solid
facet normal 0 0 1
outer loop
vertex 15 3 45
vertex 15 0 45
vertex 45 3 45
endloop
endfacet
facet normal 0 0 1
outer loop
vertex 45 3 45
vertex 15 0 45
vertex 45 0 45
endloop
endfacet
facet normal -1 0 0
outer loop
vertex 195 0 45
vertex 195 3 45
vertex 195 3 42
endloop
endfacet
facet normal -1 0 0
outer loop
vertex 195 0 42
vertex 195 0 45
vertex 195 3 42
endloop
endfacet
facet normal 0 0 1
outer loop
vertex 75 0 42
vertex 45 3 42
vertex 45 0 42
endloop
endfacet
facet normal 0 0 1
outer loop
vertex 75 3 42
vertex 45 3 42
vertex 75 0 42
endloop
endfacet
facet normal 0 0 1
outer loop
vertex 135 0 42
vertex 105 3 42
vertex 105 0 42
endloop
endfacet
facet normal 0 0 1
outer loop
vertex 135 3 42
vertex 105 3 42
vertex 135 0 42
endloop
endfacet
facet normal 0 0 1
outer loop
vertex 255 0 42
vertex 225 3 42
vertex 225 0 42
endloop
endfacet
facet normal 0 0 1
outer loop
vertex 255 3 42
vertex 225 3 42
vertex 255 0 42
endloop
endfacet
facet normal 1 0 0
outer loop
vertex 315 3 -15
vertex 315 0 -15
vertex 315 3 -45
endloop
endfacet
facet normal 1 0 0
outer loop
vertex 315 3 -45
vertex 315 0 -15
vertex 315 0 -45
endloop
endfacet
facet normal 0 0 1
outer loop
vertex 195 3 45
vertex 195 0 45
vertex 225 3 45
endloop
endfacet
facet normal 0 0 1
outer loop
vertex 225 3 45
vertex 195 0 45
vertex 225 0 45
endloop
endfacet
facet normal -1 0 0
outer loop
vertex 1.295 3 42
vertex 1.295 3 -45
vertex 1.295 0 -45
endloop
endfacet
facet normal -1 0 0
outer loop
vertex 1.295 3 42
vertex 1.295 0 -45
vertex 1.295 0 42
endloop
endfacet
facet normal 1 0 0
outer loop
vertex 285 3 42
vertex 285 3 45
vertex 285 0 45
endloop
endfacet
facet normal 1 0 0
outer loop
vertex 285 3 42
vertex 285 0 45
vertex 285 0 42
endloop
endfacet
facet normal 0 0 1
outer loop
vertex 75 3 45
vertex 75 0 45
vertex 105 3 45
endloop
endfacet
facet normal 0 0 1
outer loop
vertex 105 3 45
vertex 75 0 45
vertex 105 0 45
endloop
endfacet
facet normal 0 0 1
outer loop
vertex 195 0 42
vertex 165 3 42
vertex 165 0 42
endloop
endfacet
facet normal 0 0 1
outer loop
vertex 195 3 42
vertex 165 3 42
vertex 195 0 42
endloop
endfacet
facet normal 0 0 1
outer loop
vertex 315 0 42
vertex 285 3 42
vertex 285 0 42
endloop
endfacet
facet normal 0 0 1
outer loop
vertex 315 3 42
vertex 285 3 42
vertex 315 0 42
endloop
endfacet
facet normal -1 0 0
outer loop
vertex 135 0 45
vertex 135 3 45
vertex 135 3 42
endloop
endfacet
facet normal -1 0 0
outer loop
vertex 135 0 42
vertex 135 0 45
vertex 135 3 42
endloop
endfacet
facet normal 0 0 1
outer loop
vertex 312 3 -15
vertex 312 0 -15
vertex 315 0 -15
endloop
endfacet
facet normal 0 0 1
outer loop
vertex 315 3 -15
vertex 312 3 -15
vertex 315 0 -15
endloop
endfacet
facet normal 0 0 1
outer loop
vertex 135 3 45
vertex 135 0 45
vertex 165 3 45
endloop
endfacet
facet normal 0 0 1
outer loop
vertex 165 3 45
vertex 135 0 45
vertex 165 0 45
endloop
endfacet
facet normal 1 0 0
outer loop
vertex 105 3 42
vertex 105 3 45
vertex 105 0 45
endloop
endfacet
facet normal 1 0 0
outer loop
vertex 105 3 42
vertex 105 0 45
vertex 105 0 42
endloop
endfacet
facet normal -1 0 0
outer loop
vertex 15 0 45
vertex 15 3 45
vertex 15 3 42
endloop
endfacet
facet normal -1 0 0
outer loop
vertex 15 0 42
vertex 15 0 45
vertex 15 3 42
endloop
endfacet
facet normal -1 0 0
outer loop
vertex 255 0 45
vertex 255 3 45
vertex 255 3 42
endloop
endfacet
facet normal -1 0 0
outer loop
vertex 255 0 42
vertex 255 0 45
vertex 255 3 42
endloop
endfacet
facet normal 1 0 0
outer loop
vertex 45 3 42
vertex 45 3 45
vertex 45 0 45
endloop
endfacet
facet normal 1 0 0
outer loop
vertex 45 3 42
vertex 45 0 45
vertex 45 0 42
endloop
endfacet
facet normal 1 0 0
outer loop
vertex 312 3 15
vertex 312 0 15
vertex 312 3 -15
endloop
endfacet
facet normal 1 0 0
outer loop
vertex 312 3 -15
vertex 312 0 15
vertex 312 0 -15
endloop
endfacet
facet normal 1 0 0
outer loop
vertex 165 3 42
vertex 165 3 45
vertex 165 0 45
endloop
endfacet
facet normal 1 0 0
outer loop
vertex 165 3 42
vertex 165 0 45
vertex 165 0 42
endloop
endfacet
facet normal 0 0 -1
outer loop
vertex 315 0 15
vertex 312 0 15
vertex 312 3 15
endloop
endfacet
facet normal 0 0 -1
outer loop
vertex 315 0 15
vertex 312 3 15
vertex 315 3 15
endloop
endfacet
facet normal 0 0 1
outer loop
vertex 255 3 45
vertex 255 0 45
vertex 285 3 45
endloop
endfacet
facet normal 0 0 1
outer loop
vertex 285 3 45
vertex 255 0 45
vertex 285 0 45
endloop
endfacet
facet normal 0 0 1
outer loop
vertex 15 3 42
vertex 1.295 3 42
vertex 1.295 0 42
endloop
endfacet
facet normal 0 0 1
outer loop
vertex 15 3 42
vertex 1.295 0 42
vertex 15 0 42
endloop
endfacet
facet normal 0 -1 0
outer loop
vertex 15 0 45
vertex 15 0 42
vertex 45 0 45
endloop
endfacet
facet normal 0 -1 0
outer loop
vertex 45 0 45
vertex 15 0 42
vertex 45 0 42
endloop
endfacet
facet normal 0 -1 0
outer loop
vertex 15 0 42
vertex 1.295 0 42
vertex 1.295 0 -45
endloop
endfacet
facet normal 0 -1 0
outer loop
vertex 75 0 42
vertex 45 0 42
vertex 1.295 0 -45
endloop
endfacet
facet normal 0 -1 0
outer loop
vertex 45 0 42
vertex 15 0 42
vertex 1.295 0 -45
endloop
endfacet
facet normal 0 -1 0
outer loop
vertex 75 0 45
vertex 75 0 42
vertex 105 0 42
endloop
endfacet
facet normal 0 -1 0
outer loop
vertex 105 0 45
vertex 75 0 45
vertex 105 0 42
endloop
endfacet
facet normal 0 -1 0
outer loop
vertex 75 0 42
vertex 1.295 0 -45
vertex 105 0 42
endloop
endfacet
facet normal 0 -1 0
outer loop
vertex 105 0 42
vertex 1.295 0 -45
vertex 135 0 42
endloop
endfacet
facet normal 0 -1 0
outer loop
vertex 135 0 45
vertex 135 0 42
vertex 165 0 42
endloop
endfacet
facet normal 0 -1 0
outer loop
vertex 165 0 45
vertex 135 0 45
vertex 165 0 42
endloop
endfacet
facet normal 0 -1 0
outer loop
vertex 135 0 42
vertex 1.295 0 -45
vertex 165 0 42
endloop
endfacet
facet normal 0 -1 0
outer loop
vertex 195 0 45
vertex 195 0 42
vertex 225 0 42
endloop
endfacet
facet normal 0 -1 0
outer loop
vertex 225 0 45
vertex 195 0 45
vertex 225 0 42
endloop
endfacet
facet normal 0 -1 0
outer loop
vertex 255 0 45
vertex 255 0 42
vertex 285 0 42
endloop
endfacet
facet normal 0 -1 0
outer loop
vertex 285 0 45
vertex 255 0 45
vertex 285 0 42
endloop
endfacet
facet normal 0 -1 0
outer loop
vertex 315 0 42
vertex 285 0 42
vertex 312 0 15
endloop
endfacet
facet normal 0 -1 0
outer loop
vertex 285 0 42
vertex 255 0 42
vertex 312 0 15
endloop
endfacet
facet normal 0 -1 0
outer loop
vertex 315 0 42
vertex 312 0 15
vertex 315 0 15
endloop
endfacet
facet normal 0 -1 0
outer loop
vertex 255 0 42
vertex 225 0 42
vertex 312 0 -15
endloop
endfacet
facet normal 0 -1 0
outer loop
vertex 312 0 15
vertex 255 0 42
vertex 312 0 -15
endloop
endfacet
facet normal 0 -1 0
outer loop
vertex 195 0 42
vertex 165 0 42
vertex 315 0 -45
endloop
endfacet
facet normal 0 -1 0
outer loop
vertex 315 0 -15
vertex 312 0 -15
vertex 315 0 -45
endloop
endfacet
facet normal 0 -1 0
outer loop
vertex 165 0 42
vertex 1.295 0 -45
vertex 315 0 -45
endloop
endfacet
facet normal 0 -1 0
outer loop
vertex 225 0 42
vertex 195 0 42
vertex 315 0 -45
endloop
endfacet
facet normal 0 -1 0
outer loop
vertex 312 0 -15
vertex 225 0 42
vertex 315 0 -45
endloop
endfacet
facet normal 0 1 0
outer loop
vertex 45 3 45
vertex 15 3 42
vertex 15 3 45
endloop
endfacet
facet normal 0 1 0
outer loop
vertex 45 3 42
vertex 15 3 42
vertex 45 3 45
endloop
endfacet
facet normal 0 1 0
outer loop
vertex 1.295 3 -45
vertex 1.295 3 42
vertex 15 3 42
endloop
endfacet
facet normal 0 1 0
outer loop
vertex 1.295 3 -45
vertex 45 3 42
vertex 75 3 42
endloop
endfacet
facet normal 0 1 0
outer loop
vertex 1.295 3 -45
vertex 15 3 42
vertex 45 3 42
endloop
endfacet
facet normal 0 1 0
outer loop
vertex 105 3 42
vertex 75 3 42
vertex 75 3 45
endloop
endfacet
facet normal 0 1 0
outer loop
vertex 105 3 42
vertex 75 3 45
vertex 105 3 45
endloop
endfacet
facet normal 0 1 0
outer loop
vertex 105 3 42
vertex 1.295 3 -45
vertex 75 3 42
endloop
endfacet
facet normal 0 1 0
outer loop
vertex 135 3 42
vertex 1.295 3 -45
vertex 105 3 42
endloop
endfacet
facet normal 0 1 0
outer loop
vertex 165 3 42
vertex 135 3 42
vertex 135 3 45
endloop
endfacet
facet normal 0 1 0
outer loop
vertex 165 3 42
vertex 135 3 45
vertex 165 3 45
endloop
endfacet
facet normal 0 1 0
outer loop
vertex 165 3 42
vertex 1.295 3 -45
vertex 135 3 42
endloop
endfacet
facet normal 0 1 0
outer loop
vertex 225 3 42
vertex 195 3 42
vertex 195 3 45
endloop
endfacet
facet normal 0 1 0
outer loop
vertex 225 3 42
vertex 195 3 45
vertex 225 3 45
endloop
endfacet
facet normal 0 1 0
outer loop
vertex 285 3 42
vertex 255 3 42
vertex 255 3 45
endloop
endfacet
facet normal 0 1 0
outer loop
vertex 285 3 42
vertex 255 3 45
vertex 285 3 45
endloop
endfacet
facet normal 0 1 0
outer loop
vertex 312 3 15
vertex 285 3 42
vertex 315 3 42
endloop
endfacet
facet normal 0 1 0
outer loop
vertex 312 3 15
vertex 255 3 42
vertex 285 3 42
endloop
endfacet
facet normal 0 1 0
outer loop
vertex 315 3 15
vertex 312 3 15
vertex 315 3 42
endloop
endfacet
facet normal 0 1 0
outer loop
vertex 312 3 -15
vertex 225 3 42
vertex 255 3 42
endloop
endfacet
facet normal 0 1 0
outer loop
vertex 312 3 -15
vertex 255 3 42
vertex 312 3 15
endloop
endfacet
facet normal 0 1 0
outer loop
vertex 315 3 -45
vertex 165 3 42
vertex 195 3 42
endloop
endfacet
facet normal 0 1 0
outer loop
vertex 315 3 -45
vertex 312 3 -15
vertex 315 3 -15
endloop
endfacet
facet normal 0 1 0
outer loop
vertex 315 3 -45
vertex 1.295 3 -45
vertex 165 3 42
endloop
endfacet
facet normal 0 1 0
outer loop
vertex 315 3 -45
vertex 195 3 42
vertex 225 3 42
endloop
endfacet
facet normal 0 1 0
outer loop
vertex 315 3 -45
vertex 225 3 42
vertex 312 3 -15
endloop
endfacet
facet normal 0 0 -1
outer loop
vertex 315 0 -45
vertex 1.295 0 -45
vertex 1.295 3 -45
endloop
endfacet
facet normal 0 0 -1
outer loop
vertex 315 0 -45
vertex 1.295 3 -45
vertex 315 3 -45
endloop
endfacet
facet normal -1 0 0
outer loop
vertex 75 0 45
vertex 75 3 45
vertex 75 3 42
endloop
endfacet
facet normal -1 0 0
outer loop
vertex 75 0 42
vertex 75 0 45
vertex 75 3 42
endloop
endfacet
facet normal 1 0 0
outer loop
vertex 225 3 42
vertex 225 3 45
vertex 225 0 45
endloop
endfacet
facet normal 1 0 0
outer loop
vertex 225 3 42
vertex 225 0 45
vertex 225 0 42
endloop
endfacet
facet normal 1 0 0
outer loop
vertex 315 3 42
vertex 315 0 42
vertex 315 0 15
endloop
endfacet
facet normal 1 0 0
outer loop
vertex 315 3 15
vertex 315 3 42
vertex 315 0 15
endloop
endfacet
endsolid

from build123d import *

# Parameters (mm, degrees)
SKETCH1_W              = 630
SKETCH1_H              = 90
BOSS_EXTRUDE1_DEPTH    = 3
SKETCH3_W              = 30
SKETCH3_H              = 3
CUT_EXTRUDE1_DEPTH     = 3
LPATTERN1_COUNT        = 10
LPATTERN1_PITCH        = 60
LPATTERN1_COL_COUNT    = 2
LPATTERN1_COL_PITCH    = 60
CUT_EXTRUDE5_START     = -3
CUT_EXTRUDE5_OUTLINE_W = 3
CUT_EXTRUDE5_OUTLINE_H = 30
CUT_EXTRUDE5_DEPTH     = 3
SKETCH7_W              = 3
SKETCH7_H              = 30
CUT_EXTRUDE3_DEPTH     = 3
SKETCH13_W             = 3
SKETCH13_H             = 27
CUT_EXTRUDE4_DEPTH     = 10


# Read off the part's stored shape, not the designer's step: Cut-Extrude5
with BuildPart() as part:
    # Sketch1 → Boss-Extrude1 (new body)
    with BuildSketch(Plane(origin=(0, 0, 0), x_dir=(1, 0, 0), z_dir=(0, 1, 0))):
        Rectangle(SKETCH1_W, SKETCH1_H)
    extrude(amount=BOSS_EXTRUDE1_DEPTH)

    # Sketch3 → Cut-Extrude1 (cut)
    with BuildSketch(Plane(origin=(0, 3, 0), x_dir=(1, 0, 0), z_dir=(0, 1, 0))):
        with Locations((-240, -43.5)):
            Rectangle(SKETCH3_W, SKETCH3_H)
    cut_extrude1 = extrude(amount=-CUT_EXTRUDE1_DEPTH, mode=Mode.SUBTRACT)

    # LPattern1: Cut-Extrude1 ×10
    with Locations(*[(i * LPATTERN1_PITCH, 0, 0) for i in range(1, LPATTERN1_COUNT)]):
        add(cut_extrude1, mode=Mode.SUBTRACT)

    # LPattern1 col: Cut-Extrude1 ×2
    with Locations(*[(-i * LPATTERN1_COL_PITCH, 0, 0) for i in range(1, LPATTERN1_COL_COUNT)]):
        add(cut_extrude1, mode=Mode.SUBTRACT)

    # Cut-Extrude5 outline → Cut-Extrude5 (cut)
    with BuildSketch(Plane(origin=(0, 3, 0), x_dir=(1, 0, 0), z_dir=(0, 1, 0)).offset(CUT_EXTRUDE5_START)):
        with Locations((313.5, 1e-09)):
            Rectangle(CUT_EXTRUDE5_OUTLINE_W, CUT_EXTRUDE5_OUTLINE_H)
    extrude(amount=CUT_EXTRUDE5_DEPTH, mode=Mode.SUBTRACT)

    # Sketch7 → Cut-Extrude3 (cut)
    with BuildSketch(Plane(origin=(0, 3, 0), x_dir=(1, 0, 0), z_dir=(0, 1, 0))):
        with Locations((-313.5, 30)):
            Rectangle(SKETCH7_W, SKETCH7_H)
    extrude(amount=-CUT_EXTRUDE3_DEPTH, mode=Mode.SUBTRACT)

    # Sketch13 → Cut-Extrude4 (cut)
    with BuildSketch(Plane(origin=(0, 3, 0), x_dir=(1, 0, 0), z_dir=(0, 1, 0))):
        with Locations((-313.5, -28.5)):
            Rectangle(SKETCH13_W, SKETCH13_H)
    extrude(amount=-CUT_EXTRUDE4_DEPTH, mode=Mode.SUBTRACT)

    # SurfaceCut1
    split(bisect_by=Plane.ZY.offset(-1.295), keep=Keep.BOTTOM)


solid = part.part
